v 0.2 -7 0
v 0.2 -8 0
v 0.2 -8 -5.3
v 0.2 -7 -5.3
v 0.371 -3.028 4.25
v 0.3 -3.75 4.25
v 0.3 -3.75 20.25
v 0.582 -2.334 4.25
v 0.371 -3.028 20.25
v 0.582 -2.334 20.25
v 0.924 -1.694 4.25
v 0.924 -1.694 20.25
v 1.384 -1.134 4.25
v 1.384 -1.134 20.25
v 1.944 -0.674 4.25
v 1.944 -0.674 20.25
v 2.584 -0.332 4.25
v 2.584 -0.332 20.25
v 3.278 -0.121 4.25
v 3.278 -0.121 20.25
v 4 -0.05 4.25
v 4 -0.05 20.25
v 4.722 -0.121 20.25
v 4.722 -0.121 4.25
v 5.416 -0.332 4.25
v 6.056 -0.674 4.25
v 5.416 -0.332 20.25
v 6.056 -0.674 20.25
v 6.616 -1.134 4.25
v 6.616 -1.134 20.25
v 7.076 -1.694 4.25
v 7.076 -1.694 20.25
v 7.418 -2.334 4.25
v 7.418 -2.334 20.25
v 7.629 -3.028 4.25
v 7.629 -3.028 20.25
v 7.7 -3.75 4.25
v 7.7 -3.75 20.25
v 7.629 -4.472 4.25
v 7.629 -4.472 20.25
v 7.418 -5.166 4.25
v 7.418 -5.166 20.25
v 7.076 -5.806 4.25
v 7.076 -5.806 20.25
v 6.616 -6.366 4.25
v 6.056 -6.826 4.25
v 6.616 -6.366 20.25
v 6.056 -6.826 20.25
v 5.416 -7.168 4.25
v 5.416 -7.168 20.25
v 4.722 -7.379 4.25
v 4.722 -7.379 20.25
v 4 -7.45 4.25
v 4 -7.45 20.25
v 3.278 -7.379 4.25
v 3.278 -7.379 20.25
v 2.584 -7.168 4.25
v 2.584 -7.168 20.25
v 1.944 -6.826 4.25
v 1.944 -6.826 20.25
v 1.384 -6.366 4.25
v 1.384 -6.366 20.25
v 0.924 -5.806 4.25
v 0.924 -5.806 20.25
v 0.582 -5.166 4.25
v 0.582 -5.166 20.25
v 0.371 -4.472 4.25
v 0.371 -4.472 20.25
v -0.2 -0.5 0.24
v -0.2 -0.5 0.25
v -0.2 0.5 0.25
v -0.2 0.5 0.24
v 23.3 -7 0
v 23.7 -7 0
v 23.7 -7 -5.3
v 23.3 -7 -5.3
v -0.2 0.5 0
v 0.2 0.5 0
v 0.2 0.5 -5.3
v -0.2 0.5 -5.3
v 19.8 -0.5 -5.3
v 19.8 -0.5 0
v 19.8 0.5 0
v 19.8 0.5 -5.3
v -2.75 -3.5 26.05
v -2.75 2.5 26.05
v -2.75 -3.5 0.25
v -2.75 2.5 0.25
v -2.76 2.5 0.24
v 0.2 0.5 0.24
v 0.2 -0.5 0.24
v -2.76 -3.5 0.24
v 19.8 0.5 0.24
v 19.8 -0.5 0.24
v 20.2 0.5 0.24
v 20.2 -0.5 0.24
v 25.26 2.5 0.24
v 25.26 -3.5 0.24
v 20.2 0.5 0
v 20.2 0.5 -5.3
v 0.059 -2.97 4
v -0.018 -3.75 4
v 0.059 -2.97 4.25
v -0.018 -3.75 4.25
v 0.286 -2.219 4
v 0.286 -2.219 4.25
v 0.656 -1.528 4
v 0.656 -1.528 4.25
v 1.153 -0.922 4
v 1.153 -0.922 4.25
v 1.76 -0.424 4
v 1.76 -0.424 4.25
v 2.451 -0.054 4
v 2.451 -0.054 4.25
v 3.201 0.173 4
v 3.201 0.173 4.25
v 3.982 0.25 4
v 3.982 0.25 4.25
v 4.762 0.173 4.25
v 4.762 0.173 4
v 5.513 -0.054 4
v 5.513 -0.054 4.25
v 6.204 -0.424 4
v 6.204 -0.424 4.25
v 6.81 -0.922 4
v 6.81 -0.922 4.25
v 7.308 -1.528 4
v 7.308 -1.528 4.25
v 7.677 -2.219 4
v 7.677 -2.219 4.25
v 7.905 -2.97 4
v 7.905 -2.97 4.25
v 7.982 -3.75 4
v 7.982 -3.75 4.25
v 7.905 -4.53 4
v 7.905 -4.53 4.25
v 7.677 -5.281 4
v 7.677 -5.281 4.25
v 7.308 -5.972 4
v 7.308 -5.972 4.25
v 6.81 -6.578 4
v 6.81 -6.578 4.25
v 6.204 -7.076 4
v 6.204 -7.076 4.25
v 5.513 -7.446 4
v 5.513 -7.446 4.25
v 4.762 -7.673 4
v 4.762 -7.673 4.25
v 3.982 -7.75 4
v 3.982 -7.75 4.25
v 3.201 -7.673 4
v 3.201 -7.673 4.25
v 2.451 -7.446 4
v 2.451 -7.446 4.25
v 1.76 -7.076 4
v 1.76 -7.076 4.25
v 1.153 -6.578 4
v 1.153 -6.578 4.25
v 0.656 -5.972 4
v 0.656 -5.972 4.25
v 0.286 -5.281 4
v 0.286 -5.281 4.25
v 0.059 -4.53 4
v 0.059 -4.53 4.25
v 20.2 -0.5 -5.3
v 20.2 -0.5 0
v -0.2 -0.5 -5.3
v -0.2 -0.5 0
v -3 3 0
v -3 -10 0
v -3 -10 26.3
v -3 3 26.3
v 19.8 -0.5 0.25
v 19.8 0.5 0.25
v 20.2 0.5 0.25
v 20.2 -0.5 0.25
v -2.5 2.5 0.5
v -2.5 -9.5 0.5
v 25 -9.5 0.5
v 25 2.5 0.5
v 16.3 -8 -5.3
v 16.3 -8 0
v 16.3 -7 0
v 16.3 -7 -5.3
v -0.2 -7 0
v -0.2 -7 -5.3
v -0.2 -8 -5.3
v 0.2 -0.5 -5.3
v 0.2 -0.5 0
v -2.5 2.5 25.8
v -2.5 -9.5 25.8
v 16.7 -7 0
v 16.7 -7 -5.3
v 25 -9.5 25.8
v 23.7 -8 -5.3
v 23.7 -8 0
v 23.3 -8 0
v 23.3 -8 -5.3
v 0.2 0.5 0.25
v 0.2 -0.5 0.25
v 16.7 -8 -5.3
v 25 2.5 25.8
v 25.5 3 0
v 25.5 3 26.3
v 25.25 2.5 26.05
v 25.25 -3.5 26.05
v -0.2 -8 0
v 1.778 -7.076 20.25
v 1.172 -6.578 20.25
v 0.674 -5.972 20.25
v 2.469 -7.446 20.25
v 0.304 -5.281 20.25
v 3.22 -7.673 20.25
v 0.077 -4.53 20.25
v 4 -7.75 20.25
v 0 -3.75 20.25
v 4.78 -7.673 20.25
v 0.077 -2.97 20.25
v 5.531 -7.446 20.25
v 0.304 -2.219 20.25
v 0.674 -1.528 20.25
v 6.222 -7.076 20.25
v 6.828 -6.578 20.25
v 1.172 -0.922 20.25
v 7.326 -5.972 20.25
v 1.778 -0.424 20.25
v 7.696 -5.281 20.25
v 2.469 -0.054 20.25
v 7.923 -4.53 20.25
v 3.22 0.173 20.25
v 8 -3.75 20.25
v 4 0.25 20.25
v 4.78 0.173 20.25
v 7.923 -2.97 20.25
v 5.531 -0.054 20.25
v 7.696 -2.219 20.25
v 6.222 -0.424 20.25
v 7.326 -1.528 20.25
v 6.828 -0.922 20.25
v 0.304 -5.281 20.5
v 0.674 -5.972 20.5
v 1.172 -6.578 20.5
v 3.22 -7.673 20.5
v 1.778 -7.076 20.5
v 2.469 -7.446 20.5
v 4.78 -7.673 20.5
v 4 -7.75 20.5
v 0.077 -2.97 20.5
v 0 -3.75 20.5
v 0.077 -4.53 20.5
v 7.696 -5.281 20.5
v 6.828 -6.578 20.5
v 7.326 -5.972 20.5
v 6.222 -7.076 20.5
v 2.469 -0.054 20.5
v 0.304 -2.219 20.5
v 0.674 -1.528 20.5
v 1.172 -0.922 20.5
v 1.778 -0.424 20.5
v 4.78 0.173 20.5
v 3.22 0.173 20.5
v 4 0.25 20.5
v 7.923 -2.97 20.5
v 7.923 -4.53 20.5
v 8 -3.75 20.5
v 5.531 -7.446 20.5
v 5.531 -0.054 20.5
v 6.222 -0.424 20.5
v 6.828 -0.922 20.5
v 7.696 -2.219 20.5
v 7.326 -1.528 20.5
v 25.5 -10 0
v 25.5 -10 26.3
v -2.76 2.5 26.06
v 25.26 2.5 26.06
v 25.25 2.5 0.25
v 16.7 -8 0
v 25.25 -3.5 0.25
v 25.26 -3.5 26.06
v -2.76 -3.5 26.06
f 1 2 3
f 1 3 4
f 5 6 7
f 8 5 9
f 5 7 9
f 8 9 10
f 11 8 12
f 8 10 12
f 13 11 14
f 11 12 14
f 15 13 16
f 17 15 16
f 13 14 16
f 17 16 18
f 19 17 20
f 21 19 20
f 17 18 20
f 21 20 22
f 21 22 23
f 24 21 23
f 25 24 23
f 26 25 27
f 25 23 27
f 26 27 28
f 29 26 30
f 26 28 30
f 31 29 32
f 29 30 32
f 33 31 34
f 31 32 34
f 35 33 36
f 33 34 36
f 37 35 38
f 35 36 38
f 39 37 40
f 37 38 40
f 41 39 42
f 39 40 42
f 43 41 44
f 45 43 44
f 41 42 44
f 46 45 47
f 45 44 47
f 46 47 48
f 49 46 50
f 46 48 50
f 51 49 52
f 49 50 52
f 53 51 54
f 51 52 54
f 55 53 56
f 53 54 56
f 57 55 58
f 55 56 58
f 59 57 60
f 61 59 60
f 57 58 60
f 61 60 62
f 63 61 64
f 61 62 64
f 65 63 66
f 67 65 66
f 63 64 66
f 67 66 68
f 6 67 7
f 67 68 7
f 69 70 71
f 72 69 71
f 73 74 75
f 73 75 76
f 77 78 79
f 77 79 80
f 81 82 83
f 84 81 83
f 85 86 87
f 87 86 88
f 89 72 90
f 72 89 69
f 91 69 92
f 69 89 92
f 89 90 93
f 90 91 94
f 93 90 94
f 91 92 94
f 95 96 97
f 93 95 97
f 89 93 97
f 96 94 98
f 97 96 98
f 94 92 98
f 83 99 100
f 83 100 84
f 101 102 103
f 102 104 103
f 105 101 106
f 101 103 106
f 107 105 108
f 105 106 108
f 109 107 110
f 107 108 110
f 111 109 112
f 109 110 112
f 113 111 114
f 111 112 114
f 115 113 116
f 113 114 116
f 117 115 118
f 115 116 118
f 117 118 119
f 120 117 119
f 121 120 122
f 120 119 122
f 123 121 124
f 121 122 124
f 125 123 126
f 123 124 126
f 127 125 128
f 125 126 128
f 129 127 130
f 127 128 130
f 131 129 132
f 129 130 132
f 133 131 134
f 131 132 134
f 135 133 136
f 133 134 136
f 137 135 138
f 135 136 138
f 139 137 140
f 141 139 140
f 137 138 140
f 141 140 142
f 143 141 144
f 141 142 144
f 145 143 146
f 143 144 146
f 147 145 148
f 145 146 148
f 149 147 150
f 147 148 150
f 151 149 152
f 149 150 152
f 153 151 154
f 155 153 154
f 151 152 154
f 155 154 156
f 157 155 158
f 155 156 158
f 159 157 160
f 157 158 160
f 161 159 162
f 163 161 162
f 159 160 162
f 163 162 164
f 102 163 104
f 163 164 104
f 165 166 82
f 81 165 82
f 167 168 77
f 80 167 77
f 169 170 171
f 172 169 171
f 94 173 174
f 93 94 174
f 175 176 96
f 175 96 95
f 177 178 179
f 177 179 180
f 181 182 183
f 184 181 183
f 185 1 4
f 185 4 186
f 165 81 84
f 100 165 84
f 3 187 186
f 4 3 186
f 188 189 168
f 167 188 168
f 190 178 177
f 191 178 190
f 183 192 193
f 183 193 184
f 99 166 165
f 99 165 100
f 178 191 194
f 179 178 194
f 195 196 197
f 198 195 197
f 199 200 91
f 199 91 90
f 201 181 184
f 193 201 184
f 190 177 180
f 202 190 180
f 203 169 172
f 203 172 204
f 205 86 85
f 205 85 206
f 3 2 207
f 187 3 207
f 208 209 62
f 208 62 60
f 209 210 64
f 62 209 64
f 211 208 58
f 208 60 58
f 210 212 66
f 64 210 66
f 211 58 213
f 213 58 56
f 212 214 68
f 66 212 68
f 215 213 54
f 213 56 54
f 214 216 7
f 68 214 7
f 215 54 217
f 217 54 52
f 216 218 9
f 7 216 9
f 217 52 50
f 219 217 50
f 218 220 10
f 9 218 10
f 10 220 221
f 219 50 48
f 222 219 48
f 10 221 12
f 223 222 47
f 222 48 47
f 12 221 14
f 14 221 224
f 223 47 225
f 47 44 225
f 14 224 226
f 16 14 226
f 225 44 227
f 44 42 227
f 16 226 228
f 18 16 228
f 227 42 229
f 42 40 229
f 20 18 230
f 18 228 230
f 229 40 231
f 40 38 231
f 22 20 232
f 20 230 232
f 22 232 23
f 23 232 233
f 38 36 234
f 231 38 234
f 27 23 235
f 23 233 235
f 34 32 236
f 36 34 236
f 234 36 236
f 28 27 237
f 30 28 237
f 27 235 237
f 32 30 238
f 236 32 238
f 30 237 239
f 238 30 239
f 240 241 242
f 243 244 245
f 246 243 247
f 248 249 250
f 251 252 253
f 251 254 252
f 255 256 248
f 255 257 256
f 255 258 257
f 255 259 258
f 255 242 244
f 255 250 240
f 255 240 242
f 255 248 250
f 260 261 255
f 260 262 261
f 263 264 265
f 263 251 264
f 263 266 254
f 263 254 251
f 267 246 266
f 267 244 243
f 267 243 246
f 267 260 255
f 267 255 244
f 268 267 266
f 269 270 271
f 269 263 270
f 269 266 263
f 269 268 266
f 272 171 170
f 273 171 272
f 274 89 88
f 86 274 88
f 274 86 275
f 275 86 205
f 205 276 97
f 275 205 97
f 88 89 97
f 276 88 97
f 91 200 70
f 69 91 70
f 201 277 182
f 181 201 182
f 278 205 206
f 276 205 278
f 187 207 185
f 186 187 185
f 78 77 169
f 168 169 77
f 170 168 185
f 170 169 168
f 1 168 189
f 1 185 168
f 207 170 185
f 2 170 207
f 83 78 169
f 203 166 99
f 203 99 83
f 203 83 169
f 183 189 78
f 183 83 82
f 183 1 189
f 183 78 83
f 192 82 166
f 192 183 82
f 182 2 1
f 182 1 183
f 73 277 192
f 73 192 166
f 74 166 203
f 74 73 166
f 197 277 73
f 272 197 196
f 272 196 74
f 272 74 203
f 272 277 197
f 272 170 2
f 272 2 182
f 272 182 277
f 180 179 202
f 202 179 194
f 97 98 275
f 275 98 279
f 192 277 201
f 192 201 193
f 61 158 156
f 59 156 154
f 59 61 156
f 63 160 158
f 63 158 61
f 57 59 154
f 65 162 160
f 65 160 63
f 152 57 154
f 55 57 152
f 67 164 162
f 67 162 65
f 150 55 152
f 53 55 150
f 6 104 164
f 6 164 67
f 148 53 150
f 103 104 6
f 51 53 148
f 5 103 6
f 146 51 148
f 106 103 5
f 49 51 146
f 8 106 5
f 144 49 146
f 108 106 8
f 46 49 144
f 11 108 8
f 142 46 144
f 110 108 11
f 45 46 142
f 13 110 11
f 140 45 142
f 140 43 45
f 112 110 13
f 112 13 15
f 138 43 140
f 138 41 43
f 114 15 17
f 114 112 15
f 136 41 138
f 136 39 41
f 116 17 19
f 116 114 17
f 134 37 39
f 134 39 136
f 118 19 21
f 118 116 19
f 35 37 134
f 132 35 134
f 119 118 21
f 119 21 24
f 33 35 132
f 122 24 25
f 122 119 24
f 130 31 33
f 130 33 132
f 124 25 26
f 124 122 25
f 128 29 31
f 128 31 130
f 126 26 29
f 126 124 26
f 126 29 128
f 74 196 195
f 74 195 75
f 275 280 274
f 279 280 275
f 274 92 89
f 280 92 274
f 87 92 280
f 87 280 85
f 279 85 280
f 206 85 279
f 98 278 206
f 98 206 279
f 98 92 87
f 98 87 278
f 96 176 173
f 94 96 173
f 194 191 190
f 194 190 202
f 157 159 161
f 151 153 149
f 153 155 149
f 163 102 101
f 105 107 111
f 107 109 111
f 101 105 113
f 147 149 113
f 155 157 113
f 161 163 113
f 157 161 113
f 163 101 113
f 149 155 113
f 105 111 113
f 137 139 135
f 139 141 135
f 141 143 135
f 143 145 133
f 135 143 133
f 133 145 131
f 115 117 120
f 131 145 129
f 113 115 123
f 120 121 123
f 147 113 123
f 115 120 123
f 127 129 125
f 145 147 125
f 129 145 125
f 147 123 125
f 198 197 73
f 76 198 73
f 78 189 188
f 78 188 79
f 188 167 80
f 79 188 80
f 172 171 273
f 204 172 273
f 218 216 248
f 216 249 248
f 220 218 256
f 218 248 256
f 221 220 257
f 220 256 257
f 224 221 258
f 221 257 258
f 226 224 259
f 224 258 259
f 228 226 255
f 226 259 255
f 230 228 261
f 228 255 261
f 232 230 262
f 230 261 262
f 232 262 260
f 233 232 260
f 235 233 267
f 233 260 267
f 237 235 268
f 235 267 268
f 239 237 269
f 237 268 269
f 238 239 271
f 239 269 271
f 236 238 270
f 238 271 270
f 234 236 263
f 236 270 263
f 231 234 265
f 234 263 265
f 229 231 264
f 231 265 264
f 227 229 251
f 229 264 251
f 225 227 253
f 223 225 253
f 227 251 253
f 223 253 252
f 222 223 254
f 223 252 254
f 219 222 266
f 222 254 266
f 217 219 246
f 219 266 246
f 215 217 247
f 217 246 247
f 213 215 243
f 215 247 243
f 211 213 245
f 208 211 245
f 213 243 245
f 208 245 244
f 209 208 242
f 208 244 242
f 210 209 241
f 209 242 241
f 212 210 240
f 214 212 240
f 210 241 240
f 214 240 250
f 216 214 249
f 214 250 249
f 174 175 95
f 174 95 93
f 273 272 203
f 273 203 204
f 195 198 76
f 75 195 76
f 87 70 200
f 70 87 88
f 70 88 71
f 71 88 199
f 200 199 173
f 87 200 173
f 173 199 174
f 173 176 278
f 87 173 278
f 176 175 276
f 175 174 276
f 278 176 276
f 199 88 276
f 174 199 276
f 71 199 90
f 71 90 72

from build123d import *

# Parameters (mm, degrees)
SKETCH006_W   = 28.5
SKETCH006_H   = 26.3
SKETCH006_W_2 = 27.5
SKETCH006_H_2 = 25.3
PAD002_DEPTH  = 12
SKETCH007_W   = 28.5
SKETCH007_H   = 26.3
SKETCH007_W_2 = 28
SKETCH007_H_2 = 25.8
POCKET_DEPTH  = 6
SKETCH005_W   = 28.5
SKETCH005_H   = 26.3
PAD001_DEPTH  = 0.5
SKETCH002_W   = 3.7
SKETCH002_H   = 16
SKETCH003_W   = 4
SKETCH003_H   = 0.25
SKETCH004_W   = 4
SKETCH004_H   = 0.25
SKETCH_W      = 1
SKETCH_H      = 0.4
PAD_DEPTH     = 5.8
SKETCH009_W   = 28.5
SKETCH009_H   = 26.3
SKETCH009_W_2 = 28.02
SKETCH009_H_2 = 25.82
PAD004_DEPTH  = 6
SKETCH010_W   = 28.5
SKETCH010_H   = 26.3
PAD005_DEPTH  = 0.5


with BuildPart() as pocket:
    # Sketch006 → Pad002 (new body)
    with BuildSketch(Plane.XZ.offset(9.5)):
        with Locations((11.25, 13.15)):
            Rectangle(SKETCH006_W, SKETCH006_H)
        with Locations((11.25, 13.15)):
            Rectangle(SKETCH006_W_2, SKETCH006_H_2, mode=Mode.SUBTRACT)
    extrude(amount=-PAD002_DEPTH)

    # Sketch007 → Pocket (cut)
    with BuildSketch(Plane(origin=(0, 2.5, 0), x_dir=(1, 0, 0), z_dir=(0, 1, 0))):
        with Locations((11.25, -13.15)):
            Rectangle(SKETCH007_W, SKETCH007_H)
        with Locations((11.25, -13.15)):
            Rectangle(SKETCH007_W_2, SKETCH007_H_2, mode=Mode.SUBTRACT)
    extrude(amount=-POCKET_DEPTH, mode=Mode.SUBTRACT)


with BuildPart() as pad001:
    # Sketch005 → Pad001 (new body)
    with BuildSketch(Plane.XZ.offset(10)):
        with Locations((11.25, 13.15)):
            Rectangle(SKETCH005_W, SKETCH005_H)
    extrude(amount=-PAD001_DEPTH)


with BuildPart() as revolution:
    # Sketch002 → Revolution (revolve)
    with BuildSketch(Plane(origin=(0, -3.75, 0), x_dir=(-1, 0, 0), z_dir=(0, 1, 0))):
        with Locations((-2.15, 12.25)):
            Rectangle(SKETCH002_W, SKETCH002_H)
    revolve(axis=Axis((4, -3.75, 21.020615), (0, 0, -1)))


with BuildPart() as revolution001:
    # Sketch003 → Revolution001 (revolve)
    with BuildSketch(Plane(origin=(0, -3.75, 0), x_dir=(-1, 0, 0), z_dir=(0, 1, 0))):
        with Locations((-1.981829, 4.125)):
            Rectangle(SKETCH003_W, SKETCH003_H)
    revolve(axis=Axis((3.981829, -3.75, 21.020615), (0, 0, -1)))


with BuildPart() as revolution002:
    # Sketch004 → Revolution002 (revolve)
    with BuildSketch(Plane(origin=(0, -3.75, 0), x_dir=(-1, 0, 0), z_dir=(0, 1, 0))):
        with Locations((-2, 20.375)):
            Rectangle(SKETCH004_W, SKETCH004_H)
    revolve(axis=Axis((4, -3.75, 21.020615), (0, 0, -1)))


with BuildPart() as pad:
    # Sketch → Pad (new body)
    with BuildSketch(Plane(origin=(0, -7.5, 0.5), x_dir=(0, 1, 0), z_dir=(0, 0, 1))):
        Rectangle(SKETCH_W, SKETCH_H)
        with Locations((7.5, 0)):
            Rectangle(SKETCH_W, SKETCH_H)
        with Locations((0, -16.5)):
            Rectangle(SKETCH_W, SKETCH_H)
        with Locations((0, -23.5)):
            Rectangle(SKETCH_W, SKETCH_H)
        with Locations((7.5, -20)):
            Rectangle(SKETCH_W, SKETCH_H)
    extrude(amount=-PAD_DEPTH)


with BuildPart() as pad005_mp_cp:
    # Sketch009 → Pad004 (new body)
    with BuildSketch(Plane.XZ.offset(3.5)):
        with Locations((11.25, 13.15)):
            Rectangle(SKETCH009_W, SKETCH009_H)
        with Locations((11.25, 13.15)):
            Rectangle(SKETCH009_W_2, SKETCH009_H_2, mode=Mode.SUBTRACT)
    extrude(amount=-PAD004_DEPTH)

    # Sketch010 → Pad005 (new body)
    with BuildSketch(Plane(origin=(0, 2.5, 0), x_dir=(1, 0, 0), z_dir=(0, 1, 0))):
        with Locations((11.25, -13.15)):
            Rectangle(SKETCH010_W, SKETCH010_H)
    extrude(amount=PAD005_DEPTH)

    # Pad005_mp_cp: union Pocket, Pad001, Revolution, Revolution001, Revolution002, Pad
    add(pocket.part)
    add(pad001.part)
    add(revolution.part)
    add(revolution001.part)
    add(revolution002.part)
    add(pad.part)


solid = pad005_mp_cp.part
